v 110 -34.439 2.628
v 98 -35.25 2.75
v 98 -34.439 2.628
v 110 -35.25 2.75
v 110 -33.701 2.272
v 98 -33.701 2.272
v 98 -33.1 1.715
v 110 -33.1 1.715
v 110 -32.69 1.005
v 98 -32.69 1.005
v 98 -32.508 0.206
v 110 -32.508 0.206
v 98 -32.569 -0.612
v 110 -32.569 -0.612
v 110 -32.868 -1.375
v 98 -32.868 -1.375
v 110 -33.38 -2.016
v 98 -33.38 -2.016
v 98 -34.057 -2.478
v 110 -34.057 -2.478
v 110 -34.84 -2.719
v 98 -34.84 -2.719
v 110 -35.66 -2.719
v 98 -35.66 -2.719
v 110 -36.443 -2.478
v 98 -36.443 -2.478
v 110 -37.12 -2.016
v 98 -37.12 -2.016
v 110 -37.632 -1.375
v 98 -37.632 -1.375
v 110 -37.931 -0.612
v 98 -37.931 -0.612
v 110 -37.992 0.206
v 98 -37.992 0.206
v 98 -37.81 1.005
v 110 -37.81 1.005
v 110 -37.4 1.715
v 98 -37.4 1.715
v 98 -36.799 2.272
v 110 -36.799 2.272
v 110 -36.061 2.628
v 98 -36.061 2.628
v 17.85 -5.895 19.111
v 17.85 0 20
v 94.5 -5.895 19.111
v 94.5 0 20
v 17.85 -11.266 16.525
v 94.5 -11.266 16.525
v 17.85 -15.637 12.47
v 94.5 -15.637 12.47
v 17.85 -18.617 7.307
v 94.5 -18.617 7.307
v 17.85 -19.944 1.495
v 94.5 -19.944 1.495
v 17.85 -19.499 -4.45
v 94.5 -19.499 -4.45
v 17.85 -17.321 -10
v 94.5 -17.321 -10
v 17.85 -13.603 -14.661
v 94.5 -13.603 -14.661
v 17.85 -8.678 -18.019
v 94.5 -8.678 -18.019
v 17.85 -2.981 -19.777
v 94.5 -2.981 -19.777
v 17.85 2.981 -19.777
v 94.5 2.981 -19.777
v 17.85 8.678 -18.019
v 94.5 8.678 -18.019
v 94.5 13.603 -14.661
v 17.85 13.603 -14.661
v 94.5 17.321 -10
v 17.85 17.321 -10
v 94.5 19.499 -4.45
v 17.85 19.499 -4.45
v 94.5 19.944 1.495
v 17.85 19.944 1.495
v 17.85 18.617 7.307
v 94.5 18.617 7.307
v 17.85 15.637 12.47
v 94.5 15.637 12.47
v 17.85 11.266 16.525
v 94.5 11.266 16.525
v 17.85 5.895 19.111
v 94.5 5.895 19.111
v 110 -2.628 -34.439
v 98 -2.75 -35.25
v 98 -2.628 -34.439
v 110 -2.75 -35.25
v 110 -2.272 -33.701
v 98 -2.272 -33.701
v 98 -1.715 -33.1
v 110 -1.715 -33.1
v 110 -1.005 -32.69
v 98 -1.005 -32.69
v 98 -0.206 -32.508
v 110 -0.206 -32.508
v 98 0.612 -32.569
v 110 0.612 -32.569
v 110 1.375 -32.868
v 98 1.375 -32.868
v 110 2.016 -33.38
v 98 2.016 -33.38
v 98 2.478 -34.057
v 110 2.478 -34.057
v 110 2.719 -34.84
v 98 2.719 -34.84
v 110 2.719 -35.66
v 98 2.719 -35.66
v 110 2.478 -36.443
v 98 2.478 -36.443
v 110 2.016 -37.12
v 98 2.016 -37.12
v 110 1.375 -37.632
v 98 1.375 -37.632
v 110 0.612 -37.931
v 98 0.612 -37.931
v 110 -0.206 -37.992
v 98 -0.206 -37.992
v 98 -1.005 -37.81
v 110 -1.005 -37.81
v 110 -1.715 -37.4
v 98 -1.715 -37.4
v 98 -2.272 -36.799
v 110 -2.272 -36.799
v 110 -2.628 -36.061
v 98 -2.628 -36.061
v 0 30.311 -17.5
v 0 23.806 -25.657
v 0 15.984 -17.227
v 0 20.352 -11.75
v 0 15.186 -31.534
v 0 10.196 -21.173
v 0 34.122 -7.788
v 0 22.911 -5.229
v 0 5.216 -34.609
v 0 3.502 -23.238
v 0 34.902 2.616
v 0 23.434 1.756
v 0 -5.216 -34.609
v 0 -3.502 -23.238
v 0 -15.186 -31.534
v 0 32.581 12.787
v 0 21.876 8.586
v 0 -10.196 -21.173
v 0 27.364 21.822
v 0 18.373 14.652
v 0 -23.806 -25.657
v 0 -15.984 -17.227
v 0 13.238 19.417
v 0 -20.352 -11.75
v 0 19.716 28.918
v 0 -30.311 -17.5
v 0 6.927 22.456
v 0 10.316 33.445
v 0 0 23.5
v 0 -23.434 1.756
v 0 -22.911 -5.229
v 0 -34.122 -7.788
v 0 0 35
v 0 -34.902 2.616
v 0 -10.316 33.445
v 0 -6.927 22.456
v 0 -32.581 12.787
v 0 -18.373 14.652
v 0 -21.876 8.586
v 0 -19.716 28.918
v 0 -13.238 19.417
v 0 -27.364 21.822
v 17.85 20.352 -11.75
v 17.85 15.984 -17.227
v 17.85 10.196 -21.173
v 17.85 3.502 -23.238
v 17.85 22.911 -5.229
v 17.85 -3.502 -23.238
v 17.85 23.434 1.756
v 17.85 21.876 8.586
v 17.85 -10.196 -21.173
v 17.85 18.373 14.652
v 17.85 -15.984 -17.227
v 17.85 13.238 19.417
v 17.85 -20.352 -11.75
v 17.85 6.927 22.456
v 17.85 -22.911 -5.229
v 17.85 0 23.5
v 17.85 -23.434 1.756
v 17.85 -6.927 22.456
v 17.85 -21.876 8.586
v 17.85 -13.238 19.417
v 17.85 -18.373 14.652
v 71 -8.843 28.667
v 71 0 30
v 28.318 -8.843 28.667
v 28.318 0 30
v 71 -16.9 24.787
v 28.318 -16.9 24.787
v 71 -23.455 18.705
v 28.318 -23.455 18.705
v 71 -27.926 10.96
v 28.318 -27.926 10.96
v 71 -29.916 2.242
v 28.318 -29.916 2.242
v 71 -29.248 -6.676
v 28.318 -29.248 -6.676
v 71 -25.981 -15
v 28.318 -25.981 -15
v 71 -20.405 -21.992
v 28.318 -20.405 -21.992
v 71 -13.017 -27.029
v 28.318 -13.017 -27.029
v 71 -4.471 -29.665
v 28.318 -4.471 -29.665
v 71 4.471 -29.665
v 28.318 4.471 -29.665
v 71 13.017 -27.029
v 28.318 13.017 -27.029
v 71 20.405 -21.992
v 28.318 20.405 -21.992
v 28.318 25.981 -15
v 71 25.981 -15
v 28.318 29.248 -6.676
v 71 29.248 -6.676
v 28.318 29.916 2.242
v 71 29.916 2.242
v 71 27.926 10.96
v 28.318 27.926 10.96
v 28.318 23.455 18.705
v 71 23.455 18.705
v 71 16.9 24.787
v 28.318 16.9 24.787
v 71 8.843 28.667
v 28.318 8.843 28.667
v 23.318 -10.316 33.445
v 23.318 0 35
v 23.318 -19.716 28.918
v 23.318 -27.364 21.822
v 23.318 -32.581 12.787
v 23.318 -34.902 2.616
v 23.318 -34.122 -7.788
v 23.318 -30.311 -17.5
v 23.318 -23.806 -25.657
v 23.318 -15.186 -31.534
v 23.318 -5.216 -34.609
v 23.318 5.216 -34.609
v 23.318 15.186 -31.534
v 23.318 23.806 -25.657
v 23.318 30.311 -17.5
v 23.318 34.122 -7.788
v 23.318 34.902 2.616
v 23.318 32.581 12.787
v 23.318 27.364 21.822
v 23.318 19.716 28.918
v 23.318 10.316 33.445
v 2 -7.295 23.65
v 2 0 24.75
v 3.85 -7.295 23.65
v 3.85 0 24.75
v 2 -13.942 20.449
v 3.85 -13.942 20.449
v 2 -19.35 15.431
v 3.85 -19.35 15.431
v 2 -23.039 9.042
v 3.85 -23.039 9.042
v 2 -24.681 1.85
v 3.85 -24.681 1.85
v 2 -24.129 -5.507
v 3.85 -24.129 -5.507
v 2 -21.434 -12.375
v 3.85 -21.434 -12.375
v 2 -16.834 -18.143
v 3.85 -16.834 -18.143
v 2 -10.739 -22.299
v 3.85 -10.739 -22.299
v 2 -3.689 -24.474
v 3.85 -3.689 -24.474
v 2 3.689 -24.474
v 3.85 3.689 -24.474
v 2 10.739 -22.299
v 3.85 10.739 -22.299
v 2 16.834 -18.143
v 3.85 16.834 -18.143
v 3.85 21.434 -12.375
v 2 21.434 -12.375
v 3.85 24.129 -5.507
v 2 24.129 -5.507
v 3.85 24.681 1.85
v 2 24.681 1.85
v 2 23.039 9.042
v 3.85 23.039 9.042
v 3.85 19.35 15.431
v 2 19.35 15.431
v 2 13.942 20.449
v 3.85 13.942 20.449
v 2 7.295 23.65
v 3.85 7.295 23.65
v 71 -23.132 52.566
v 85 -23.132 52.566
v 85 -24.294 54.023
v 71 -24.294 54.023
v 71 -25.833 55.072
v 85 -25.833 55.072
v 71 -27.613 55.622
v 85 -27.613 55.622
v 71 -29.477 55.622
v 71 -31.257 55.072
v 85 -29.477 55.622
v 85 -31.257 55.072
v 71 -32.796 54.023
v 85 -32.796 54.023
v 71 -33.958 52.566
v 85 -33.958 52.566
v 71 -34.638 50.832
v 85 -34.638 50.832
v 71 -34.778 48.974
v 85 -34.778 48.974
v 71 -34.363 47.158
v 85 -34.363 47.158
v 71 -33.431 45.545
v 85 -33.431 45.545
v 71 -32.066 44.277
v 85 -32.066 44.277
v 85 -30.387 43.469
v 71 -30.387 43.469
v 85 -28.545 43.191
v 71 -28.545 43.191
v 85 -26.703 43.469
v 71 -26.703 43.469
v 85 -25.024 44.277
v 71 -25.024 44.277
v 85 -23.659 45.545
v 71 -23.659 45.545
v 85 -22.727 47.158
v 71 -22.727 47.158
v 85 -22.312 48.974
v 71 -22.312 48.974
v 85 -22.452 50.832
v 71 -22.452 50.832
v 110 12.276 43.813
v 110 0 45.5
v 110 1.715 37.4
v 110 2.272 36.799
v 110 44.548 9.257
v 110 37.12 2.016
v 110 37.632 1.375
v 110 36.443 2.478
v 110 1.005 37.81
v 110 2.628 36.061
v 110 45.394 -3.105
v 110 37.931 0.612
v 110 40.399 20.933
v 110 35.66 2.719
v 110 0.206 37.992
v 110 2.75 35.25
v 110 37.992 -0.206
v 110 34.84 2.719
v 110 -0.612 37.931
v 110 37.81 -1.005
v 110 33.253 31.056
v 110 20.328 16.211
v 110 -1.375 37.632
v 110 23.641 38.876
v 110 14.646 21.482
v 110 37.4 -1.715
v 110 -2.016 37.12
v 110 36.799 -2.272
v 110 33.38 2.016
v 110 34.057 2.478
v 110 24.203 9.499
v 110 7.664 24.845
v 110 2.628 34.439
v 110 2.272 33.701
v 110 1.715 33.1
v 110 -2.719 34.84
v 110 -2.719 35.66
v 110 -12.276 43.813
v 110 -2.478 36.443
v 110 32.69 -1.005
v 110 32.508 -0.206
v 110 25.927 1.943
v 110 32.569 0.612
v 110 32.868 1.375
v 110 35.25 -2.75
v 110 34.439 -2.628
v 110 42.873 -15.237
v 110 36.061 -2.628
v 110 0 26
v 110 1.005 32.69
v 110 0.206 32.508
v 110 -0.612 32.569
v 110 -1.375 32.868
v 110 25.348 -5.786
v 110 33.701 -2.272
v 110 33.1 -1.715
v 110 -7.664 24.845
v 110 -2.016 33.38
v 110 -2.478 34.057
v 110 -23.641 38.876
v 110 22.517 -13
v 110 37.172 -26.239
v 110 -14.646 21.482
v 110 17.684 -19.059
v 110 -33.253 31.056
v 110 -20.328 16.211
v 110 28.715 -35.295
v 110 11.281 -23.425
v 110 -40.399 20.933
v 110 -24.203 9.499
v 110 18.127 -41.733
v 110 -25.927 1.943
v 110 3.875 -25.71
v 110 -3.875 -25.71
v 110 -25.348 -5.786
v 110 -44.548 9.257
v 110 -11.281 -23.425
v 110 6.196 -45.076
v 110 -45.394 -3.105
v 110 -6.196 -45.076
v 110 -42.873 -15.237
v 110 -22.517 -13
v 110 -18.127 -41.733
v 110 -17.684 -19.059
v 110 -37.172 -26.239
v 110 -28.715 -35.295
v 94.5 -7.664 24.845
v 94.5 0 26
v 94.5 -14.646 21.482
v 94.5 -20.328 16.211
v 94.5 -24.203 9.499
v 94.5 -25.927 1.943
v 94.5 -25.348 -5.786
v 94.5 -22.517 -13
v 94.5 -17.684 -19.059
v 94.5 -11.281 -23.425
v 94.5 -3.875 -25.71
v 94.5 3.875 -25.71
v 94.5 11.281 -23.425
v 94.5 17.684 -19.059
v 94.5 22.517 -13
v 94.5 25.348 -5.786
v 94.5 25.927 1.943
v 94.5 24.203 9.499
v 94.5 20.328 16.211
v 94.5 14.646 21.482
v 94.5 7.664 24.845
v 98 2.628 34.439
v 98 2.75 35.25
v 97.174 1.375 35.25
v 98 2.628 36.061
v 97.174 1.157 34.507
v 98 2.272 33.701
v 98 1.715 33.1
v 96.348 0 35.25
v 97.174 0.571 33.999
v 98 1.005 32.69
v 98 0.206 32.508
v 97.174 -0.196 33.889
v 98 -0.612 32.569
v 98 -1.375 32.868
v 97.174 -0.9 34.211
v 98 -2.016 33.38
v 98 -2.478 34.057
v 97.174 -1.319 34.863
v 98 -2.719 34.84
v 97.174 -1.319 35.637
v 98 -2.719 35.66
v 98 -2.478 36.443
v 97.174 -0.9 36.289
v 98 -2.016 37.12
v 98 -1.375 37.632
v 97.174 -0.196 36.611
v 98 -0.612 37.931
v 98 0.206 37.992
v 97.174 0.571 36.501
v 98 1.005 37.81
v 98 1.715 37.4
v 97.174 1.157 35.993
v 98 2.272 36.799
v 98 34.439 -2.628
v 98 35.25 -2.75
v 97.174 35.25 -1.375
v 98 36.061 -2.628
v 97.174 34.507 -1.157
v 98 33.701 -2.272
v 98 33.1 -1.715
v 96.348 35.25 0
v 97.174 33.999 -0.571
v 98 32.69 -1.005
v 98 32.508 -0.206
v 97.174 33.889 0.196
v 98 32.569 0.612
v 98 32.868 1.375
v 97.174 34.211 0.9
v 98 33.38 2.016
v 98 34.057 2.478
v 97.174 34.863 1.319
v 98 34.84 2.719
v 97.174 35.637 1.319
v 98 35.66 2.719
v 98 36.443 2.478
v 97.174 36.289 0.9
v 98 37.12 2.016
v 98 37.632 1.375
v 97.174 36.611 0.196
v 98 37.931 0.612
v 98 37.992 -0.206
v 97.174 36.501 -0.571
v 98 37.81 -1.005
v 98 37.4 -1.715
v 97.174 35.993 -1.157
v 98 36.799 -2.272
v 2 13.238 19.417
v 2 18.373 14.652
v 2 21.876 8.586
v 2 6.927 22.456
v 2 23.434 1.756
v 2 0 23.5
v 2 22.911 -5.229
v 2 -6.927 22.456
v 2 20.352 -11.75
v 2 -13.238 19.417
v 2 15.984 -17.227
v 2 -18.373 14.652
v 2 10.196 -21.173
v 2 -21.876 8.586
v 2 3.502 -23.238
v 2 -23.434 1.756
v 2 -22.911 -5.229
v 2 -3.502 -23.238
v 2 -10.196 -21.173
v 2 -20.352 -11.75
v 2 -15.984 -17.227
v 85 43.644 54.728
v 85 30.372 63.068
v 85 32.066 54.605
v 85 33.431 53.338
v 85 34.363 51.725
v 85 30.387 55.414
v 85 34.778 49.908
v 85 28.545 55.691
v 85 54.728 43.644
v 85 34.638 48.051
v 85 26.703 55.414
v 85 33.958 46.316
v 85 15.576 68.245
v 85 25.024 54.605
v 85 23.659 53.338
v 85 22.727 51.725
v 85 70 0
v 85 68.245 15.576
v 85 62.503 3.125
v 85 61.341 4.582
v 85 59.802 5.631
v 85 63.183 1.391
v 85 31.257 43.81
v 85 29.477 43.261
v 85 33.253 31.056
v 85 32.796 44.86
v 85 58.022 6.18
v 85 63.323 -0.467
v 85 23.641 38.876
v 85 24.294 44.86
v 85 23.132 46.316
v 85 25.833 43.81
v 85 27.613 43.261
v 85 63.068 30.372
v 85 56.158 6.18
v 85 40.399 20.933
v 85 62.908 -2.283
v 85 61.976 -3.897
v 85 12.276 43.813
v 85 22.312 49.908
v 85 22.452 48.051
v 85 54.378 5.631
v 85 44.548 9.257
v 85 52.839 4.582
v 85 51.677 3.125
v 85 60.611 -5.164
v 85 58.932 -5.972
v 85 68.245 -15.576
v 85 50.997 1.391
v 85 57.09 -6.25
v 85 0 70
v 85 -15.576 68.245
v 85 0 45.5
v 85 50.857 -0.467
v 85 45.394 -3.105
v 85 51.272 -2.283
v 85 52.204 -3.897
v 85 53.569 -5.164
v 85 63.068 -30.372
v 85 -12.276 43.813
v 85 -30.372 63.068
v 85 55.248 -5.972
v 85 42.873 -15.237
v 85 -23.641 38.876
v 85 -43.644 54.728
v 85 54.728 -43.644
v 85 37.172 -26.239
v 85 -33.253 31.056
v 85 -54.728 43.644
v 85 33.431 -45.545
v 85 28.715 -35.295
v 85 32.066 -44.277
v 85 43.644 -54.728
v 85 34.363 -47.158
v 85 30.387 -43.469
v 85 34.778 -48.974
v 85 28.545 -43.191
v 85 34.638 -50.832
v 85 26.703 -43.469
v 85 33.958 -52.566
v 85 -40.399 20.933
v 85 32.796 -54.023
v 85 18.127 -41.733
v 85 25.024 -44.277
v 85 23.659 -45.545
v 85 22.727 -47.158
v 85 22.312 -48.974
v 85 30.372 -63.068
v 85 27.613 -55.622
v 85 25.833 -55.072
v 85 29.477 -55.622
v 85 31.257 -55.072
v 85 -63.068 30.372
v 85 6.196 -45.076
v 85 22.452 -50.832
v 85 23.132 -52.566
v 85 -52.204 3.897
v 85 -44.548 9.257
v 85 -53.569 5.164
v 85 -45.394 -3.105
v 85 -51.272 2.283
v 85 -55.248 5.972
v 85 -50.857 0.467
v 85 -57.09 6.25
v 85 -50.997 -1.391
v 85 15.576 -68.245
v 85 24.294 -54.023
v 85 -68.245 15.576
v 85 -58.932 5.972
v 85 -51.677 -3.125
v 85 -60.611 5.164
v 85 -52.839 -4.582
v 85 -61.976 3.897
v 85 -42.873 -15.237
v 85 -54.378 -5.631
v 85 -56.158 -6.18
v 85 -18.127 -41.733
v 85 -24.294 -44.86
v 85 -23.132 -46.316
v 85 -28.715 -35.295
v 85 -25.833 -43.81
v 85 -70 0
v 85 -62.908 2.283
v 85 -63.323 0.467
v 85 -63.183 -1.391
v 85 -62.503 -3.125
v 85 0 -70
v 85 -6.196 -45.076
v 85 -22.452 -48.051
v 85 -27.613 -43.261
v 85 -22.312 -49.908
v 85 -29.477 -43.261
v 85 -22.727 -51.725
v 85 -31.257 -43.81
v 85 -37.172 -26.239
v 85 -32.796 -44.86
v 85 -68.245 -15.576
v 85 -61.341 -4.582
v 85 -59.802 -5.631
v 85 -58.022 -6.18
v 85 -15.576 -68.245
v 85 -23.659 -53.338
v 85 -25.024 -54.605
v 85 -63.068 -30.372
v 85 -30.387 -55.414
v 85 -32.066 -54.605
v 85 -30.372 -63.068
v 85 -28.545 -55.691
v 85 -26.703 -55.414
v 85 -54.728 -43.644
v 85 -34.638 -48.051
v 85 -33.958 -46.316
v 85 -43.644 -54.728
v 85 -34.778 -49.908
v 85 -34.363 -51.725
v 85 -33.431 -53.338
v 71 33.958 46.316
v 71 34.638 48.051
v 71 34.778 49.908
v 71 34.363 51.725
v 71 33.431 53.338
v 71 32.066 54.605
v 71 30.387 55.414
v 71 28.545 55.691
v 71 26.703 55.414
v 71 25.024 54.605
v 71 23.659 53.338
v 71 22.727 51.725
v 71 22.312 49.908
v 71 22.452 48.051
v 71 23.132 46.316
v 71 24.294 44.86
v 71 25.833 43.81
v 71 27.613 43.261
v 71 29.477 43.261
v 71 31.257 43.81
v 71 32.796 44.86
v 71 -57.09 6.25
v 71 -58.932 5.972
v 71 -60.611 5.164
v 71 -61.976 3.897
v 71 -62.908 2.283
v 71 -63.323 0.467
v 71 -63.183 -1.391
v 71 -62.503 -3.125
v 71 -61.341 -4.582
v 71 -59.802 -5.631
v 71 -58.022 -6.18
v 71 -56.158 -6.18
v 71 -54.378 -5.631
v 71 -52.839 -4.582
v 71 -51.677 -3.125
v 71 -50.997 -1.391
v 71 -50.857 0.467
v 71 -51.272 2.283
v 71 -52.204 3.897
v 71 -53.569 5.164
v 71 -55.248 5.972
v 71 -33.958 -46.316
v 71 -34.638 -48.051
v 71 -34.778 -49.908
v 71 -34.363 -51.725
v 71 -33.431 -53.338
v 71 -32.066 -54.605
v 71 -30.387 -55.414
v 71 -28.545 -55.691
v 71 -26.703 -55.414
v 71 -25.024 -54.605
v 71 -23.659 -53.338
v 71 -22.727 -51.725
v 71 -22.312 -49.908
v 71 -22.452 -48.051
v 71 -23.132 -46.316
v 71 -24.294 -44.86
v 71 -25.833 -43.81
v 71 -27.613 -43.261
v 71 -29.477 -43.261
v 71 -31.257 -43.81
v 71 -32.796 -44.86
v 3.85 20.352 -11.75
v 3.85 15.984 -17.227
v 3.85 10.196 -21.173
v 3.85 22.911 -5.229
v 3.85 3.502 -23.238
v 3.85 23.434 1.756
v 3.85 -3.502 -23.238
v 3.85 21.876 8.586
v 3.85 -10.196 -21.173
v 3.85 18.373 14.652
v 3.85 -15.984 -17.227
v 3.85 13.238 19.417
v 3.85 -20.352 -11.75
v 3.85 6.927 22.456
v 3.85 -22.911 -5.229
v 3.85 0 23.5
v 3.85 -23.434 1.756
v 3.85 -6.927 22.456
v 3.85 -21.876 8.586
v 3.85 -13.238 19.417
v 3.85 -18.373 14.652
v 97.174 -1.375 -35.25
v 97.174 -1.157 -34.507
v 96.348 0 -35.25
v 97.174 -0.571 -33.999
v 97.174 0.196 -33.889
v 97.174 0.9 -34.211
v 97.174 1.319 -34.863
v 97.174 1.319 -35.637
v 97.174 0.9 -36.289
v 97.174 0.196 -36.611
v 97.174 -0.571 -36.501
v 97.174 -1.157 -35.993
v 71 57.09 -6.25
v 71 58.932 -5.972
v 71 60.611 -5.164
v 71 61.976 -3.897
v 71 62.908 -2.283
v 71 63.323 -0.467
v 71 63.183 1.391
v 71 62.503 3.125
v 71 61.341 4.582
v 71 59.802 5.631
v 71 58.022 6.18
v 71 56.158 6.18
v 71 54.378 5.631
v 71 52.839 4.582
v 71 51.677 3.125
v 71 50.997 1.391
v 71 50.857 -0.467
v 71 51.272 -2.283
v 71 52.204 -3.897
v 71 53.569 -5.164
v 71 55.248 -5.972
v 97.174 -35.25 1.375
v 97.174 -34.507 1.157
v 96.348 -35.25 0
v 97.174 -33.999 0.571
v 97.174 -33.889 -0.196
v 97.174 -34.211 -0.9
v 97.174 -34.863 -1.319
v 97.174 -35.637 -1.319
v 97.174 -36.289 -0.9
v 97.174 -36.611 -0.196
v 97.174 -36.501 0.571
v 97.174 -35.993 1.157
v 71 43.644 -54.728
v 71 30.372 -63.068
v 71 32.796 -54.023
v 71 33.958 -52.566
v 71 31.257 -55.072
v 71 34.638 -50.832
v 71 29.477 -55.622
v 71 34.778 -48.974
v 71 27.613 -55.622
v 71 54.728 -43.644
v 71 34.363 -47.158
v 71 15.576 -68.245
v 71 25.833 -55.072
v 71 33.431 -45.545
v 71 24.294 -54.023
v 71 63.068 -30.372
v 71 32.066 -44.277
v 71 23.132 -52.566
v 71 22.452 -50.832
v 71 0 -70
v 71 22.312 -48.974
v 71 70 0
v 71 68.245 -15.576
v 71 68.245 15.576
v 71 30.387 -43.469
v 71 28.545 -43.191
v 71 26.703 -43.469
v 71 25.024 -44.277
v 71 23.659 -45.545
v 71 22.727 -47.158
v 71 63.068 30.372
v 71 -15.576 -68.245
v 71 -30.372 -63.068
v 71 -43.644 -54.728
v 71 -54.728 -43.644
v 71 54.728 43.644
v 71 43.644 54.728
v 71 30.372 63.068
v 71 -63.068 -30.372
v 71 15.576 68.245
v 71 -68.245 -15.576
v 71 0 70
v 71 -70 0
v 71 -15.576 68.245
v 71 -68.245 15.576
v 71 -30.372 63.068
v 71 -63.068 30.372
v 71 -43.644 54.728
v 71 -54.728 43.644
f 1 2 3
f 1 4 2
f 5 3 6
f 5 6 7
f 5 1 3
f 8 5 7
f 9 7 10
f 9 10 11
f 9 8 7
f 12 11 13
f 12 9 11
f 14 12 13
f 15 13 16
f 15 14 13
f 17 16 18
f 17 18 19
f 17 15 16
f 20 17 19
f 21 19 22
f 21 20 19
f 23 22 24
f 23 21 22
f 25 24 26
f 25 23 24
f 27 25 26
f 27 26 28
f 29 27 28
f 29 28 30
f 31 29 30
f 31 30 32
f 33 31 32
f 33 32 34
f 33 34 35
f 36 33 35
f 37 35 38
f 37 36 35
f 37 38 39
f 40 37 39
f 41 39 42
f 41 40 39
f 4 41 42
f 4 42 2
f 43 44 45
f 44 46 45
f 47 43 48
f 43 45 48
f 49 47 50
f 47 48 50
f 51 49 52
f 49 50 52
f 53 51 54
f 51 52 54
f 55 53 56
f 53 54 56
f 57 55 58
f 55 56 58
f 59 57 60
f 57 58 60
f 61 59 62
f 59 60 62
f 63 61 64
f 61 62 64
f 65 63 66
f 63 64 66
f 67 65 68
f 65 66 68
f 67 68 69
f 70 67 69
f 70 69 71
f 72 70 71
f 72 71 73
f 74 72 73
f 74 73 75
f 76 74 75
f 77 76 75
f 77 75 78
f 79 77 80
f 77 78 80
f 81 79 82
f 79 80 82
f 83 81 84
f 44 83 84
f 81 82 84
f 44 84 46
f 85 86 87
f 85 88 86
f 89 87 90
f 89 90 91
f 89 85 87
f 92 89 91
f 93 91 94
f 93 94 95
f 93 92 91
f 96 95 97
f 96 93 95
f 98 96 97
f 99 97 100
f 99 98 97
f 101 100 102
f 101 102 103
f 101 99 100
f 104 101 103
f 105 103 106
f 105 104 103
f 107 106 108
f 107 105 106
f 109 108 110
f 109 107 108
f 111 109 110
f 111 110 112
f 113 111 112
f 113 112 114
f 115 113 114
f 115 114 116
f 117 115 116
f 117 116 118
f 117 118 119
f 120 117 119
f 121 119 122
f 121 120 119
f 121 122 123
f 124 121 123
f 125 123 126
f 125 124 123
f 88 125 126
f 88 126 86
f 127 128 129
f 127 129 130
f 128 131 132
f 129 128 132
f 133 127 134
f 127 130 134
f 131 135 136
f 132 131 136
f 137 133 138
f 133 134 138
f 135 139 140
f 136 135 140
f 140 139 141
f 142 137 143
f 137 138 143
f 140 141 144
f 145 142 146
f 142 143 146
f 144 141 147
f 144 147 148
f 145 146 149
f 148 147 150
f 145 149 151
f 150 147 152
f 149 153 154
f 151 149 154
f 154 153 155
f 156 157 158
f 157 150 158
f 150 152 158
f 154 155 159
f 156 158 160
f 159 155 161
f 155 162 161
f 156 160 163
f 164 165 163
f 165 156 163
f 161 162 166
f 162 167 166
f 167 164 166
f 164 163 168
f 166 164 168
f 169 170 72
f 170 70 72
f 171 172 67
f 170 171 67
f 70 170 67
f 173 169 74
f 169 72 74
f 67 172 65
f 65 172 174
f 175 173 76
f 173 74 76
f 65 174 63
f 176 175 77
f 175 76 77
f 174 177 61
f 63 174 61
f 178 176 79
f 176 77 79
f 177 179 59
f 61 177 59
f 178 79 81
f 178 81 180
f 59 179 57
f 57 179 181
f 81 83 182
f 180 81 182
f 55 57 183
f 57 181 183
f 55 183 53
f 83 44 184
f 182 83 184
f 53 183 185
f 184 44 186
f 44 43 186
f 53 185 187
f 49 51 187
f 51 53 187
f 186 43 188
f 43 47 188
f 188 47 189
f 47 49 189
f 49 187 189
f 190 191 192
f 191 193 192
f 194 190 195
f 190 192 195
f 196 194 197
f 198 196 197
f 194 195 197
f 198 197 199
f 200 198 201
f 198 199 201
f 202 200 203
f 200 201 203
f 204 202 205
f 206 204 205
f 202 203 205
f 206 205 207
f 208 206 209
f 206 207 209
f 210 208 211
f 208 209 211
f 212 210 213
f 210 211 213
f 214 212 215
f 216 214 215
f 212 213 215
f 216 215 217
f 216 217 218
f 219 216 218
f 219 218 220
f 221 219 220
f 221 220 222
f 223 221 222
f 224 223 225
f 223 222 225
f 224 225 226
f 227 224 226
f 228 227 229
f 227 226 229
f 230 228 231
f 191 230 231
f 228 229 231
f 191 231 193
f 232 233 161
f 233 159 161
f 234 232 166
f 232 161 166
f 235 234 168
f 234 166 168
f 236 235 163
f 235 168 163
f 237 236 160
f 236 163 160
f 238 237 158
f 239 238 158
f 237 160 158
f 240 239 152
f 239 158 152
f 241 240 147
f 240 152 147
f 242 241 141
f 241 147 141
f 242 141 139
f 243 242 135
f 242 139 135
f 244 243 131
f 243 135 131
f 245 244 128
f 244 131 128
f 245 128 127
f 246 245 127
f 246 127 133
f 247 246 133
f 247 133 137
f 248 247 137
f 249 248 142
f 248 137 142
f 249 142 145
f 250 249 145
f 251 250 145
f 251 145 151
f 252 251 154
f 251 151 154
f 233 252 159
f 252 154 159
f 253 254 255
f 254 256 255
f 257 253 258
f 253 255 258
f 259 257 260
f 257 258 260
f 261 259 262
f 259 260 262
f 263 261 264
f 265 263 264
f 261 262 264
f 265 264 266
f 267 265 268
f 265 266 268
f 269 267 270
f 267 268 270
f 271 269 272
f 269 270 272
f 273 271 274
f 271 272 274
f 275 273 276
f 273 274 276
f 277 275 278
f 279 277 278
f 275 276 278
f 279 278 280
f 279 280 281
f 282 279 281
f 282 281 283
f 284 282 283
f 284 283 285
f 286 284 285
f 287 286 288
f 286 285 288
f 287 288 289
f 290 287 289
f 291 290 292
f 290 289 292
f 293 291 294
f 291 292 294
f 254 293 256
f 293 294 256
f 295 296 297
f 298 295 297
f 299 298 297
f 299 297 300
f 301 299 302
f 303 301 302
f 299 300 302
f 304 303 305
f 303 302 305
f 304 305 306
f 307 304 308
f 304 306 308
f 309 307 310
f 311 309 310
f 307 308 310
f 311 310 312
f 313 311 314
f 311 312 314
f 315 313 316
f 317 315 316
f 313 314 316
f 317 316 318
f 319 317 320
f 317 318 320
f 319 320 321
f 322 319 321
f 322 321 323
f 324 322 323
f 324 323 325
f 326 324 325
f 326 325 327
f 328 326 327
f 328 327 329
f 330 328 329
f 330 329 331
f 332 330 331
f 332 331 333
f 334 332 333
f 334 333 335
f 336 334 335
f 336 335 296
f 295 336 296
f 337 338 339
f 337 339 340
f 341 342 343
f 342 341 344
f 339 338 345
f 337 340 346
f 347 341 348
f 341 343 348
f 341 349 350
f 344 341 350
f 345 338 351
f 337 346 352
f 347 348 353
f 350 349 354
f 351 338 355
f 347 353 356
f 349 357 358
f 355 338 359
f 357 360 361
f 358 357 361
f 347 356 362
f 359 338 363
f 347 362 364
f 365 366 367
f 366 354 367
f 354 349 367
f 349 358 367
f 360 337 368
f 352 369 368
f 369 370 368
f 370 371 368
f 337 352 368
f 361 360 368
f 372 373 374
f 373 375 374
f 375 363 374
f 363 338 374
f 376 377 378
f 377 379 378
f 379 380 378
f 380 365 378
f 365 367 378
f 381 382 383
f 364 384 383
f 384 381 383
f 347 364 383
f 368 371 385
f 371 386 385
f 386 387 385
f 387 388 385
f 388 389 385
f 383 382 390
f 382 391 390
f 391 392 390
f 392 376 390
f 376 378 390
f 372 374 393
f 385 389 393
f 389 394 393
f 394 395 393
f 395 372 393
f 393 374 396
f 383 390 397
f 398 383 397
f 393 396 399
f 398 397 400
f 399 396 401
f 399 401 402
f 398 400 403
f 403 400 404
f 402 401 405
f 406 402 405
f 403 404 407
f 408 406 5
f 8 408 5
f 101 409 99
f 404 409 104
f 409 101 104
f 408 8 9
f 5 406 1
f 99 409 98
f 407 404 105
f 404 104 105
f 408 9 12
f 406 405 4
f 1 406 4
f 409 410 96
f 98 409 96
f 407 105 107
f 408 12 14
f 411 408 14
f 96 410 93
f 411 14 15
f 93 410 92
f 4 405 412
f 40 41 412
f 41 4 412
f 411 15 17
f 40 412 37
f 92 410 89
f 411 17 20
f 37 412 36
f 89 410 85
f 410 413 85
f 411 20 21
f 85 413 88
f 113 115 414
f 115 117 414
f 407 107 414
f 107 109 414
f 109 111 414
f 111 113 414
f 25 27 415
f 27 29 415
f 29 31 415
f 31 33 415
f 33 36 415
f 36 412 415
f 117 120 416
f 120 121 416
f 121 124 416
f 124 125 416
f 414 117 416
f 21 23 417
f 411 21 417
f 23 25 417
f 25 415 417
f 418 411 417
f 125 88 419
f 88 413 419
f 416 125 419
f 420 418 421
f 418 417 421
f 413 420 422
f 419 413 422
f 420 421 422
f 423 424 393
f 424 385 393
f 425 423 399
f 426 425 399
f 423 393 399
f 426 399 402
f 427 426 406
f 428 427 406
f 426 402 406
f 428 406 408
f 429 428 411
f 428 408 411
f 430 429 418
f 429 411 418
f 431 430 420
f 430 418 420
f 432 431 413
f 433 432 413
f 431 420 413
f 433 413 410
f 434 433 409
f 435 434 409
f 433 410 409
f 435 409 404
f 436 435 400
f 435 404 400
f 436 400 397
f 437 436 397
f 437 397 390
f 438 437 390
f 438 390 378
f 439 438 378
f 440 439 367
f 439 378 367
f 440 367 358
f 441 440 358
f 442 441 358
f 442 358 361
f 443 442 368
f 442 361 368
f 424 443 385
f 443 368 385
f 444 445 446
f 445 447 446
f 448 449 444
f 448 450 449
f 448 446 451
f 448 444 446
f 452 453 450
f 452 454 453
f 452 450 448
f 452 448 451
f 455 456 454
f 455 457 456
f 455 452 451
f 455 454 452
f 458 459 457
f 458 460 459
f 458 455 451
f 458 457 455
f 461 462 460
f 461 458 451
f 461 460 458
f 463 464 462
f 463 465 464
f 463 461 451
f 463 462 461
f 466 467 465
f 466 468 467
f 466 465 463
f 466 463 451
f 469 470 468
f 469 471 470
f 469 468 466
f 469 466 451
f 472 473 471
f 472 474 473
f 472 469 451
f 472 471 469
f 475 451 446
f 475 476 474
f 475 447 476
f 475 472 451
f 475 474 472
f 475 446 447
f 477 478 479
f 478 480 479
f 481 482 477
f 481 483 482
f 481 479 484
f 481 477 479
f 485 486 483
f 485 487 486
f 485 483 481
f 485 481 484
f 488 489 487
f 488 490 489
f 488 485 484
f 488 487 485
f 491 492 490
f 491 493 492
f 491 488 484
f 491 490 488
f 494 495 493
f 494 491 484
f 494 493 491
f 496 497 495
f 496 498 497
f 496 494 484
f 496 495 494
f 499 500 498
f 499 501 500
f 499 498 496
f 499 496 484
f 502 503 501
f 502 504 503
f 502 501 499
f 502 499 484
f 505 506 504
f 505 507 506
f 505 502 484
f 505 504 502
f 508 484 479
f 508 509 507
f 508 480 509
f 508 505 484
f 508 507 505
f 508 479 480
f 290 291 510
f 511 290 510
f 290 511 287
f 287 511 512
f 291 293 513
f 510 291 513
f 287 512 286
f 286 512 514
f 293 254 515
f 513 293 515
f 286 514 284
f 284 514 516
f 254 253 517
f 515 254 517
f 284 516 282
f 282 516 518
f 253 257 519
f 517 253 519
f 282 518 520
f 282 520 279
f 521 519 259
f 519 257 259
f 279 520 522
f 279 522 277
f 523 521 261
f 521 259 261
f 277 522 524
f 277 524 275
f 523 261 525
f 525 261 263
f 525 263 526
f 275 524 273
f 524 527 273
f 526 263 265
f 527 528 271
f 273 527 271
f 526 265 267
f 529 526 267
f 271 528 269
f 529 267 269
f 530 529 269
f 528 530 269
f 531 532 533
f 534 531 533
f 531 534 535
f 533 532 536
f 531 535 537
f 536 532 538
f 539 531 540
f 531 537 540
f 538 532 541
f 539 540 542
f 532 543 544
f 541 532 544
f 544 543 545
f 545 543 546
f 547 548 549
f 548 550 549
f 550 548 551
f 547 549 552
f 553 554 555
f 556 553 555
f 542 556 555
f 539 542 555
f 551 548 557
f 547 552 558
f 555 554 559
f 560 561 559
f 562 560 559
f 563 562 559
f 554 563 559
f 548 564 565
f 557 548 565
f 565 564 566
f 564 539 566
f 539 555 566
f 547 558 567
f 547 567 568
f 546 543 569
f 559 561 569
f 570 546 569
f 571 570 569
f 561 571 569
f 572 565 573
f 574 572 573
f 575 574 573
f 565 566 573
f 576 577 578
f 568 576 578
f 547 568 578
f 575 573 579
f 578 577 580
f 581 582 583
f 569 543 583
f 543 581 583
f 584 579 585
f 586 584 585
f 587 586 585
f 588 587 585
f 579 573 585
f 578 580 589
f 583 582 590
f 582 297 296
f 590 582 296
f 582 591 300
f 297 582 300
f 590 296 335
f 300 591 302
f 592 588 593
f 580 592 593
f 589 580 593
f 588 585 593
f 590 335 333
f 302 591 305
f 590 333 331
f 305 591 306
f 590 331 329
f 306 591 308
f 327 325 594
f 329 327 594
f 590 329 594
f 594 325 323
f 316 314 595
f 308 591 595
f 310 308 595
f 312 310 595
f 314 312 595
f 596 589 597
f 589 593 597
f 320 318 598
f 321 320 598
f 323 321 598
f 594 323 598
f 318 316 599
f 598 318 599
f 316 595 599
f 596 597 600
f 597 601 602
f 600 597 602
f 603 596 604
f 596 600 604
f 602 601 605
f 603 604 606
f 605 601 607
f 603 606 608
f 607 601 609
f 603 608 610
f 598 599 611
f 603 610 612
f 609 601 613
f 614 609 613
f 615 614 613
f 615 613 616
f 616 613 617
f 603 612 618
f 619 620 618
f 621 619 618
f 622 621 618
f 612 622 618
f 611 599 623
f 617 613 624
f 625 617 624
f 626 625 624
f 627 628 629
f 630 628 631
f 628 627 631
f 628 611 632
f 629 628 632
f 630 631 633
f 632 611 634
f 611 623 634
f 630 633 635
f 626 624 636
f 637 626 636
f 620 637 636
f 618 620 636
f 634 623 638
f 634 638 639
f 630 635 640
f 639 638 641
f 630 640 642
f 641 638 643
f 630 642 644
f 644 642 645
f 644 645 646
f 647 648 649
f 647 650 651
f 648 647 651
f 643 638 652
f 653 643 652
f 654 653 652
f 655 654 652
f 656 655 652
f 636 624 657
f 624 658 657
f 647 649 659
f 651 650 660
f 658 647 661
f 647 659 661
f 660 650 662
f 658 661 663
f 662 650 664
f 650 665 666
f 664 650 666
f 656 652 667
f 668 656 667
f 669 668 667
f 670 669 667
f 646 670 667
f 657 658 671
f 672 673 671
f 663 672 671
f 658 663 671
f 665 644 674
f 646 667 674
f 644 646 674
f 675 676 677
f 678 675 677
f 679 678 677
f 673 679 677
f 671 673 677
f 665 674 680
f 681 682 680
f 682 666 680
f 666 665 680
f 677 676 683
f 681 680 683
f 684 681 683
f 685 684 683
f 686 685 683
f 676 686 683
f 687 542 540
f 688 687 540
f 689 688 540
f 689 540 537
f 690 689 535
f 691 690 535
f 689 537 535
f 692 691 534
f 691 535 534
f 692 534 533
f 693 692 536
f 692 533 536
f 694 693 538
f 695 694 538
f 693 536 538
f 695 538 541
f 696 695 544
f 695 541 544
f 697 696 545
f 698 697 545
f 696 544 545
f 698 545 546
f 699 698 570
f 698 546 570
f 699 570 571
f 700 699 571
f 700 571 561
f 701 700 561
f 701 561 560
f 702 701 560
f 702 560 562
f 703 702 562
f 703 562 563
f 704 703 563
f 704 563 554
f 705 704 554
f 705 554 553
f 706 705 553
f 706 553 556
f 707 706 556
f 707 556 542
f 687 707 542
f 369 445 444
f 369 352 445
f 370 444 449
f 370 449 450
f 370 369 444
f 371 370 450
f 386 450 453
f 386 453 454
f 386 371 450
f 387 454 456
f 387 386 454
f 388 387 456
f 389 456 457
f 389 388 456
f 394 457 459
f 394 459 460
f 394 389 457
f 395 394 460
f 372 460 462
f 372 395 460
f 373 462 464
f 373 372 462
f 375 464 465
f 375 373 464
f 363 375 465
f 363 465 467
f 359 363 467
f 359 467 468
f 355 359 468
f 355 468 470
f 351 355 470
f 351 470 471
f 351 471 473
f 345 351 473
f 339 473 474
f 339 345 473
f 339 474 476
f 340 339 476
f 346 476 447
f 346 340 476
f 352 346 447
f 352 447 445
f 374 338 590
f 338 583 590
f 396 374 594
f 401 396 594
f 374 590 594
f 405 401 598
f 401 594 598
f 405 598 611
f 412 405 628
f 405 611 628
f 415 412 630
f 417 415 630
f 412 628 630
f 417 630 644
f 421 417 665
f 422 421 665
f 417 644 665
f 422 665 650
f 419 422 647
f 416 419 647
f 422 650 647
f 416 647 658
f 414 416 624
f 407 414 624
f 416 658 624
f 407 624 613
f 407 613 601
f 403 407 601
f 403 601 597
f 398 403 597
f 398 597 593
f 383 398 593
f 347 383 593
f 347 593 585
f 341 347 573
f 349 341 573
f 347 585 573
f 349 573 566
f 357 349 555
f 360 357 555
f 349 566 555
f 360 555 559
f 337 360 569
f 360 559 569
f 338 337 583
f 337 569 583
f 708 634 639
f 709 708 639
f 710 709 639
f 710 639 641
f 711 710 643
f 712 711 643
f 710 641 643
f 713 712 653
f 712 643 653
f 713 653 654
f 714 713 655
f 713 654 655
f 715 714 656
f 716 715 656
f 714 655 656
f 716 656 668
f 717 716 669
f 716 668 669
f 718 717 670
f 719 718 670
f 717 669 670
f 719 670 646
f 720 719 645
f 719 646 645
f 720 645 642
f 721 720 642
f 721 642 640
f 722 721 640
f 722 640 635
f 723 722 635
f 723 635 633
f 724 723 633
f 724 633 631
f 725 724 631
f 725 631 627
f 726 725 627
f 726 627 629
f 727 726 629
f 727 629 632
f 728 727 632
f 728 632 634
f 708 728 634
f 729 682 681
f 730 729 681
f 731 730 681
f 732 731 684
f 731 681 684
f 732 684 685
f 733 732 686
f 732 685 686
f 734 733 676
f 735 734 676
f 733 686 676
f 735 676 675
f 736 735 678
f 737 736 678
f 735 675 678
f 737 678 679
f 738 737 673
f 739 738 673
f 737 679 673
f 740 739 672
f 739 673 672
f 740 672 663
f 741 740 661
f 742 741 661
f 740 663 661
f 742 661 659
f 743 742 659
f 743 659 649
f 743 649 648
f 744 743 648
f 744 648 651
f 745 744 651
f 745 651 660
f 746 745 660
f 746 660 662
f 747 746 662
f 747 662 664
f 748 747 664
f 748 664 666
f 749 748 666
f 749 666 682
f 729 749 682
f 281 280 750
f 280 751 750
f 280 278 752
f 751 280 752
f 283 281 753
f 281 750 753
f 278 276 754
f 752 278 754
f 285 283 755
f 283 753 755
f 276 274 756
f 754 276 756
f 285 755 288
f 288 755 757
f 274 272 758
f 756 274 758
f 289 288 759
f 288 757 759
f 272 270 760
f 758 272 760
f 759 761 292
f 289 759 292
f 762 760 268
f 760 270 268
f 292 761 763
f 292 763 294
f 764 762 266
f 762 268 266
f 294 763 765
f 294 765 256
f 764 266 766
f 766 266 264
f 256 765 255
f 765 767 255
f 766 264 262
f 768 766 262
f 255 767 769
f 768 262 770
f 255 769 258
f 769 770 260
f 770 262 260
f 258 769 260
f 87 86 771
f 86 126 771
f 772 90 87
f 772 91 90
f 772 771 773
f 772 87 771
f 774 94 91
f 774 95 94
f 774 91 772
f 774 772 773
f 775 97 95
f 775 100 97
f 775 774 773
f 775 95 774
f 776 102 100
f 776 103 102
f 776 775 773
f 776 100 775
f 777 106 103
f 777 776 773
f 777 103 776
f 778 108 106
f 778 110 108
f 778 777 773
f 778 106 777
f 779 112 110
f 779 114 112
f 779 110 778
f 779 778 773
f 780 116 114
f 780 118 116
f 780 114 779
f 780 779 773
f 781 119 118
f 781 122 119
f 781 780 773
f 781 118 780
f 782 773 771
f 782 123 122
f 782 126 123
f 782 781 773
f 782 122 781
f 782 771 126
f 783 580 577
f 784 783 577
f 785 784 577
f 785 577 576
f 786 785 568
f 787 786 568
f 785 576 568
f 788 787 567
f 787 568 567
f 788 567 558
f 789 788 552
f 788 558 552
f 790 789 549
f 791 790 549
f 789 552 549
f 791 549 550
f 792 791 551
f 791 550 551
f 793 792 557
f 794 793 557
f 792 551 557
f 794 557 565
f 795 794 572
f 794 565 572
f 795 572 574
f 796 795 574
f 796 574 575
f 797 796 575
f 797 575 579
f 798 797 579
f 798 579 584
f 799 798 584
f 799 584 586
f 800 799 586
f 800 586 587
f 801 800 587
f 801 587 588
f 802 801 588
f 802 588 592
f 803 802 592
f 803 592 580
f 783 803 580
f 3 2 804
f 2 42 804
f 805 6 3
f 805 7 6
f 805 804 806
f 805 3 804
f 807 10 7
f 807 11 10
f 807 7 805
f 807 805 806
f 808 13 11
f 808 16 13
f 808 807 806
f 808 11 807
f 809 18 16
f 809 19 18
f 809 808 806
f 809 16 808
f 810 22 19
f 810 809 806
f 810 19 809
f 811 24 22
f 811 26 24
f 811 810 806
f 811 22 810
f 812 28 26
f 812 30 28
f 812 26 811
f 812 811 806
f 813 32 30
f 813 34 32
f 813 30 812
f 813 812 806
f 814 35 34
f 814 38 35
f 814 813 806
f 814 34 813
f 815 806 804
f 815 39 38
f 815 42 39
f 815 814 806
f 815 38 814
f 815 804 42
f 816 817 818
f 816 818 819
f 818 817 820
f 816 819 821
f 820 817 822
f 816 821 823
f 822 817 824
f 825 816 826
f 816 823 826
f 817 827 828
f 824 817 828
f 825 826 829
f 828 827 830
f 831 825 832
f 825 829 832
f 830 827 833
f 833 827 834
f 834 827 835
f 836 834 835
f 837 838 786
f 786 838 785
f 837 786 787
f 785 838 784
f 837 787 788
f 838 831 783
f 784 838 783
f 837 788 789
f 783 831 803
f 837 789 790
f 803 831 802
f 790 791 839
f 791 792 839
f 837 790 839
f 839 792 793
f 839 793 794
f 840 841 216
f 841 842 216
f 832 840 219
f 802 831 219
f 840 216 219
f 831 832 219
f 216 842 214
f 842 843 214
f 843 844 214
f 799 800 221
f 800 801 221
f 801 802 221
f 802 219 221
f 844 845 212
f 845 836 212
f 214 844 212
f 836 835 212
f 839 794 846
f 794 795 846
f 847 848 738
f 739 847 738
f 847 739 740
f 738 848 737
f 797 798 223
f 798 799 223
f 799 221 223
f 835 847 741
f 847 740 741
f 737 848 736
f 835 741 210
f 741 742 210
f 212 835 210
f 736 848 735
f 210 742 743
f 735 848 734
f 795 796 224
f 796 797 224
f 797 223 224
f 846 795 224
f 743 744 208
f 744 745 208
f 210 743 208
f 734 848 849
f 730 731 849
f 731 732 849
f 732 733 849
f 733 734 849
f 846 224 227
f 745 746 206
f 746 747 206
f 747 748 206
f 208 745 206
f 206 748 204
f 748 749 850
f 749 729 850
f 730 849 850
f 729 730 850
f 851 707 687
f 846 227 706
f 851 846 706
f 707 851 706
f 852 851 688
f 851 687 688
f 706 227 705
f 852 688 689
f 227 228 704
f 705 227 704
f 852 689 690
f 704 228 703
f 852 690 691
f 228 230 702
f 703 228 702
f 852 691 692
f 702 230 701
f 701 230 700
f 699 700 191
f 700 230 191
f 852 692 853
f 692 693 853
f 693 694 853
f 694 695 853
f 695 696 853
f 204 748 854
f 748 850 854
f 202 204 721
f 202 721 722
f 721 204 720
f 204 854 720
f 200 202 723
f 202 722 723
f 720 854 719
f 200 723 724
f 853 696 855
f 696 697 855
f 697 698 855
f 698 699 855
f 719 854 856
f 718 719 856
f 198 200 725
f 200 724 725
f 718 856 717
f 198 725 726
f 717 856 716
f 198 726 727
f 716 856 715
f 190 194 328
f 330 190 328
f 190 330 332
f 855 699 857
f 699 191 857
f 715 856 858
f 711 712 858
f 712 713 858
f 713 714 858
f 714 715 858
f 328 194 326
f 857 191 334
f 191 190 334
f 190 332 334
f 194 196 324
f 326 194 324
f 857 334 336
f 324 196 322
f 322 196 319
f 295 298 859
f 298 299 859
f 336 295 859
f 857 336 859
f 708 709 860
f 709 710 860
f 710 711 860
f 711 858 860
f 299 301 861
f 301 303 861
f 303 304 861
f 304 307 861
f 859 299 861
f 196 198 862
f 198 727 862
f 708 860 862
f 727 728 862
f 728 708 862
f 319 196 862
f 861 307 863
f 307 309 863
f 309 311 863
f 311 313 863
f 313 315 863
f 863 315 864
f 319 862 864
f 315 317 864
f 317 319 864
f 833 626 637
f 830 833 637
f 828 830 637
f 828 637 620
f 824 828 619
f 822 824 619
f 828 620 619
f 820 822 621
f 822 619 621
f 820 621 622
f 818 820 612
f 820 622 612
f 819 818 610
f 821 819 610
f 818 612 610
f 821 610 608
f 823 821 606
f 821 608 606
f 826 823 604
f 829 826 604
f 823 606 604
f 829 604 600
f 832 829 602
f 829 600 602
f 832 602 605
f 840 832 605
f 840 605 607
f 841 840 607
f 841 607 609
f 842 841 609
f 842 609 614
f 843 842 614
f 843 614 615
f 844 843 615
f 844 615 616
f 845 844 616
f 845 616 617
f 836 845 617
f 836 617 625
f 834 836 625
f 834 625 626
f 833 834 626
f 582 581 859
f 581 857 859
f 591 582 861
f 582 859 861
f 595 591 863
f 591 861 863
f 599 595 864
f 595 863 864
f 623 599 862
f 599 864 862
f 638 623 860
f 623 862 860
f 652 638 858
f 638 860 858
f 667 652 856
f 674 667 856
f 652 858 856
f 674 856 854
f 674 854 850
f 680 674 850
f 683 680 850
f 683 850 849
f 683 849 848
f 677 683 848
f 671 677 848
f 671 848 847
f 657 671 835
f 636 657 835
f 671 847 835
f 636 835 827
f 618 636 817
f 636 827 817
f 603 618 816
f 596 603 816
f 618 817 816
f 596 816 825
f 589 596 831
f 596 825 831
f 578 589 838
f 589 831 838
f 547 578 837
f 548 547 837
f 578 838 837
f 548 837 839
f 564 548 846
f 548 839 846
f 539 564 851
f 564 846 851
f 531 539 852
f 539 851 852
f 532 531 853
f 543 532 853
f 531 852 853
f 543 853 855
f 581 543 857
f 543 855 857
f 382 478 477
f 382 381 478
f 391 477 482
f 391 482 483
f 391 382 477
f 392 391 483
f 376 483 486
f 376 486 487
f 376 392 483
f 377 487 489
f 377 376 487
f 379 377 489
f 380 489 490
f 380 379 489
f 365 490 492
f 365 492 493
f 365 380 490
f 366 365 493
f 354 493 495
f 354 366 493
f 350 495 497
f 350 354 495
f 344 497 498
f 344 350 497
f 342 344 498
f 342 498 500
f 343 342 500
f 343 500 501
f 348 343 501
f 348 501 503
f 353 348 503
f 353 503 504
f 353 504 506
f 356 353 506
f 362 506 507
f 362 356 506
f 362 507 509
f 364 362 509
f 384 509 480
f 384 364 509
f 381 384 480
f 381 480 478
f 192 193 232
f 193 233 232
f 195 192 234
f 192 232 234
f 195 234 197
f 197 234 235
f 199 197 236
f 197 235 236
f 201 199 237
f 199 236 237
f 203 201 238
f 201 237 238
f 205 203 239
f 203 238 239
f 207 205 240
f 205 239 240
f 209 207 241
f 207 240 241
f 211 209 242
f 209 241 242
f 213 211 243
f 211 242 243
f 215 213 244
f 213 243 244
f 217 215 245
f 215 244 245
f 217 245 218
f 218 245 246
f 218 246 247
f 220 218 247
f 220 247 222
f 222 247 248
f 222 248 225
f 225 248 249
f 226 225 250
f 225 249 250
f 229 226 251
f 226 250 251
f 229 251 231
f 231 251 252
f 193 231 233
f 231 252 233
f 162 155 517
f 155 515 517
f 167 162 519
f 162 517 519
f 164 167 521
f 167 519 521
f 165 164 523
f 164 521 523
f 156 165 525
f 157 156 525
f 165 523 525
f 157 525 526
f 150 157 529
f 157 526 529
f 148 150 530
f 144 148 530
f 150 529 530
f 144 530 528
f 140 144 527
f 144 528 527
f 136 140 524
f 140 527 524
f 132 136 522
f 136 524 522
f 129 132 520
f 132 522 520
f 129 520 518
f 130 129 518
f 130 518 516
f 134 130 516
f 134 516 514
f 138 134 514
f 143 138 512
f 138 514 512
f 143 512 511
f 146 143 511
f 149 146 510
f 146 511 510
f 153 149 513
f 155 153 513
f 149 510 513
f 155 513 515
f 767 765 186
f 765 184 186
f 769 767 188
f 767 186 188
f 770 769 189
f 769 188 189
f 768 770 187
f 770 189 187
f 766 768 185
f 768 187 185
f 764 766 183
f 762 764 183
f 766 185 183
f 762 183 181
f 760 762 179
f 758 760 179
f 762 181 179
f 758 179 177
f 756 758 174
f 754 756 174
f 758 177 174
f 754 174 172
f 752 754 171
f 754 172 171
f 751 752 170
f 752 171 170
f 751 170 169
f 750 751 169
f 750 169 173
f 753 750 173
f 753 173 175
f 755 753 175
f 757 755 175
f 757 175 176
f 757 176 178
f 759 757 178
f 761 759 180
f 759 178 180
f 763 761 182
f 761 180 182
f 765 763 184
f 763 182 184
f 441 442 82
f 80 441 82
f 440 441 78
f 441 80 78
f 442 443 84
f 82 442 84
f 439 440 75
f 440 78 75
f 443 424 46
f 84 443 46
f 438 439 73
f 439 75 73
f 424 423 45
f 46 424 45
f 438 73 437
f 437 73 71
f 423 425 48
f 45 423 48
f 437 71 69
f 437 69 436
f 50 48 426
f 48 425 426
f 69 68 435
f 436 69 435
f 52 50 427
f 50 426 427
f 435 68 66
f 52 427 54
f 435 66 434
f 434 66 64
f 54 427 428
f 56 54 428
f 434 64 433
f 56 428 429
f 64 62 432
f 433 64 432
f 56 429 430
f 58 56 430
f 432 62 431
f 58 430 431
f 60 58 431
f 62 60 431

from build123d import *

# Parameters (mm, degrees)
FORO_12_5_12_5_1_D          = 12.5
RIPETIZIONECIRCOLARE1_COUNT = 6
RIPETIZIONECIRCOLARE2_COUNT = 4


with BuildPart() as part:
    # Schizzo1 → Rivoluzione1 (revolve)
    with BuildSketch(Plane.XY, mode=Mode.PRIVATE) as rivoluzione1_sk:
        Polygon((0, 35), (0, 23.5), (2, 23.5), (2, 24.75), (3.85, 24.75), (3.85, 23.5), (17.85, 23.5), (17.85, 20), (94.5, 20), (94.5, 26), (110, 26), (110, 45.5), (85, 45.5), (85, 70), (71, 70), (71, 30), (28.317889407, 30), (23.317889407, 35), align=None)
    revolve(rivoluzione1_sk.sketch.rotate(Axis((-28.748065329, 0, 0), (1, 0, 0)), 90), axis=Axis((-28.748065329, 0, 0), (1, 0, 0)))

    # Foro Ø12.5 (12.5)-1 (through all)
    with Locations(Plane.ZY.offset(-71)):
        with Locations((0, 57.09)):
            foro_12_5_12_5_1 = Hole(FORO_12_5_12_5_1_D / 2)

    # RipetizioneCircolare1: Foro Ø12.5 (12.5)-1 ×6 about axis
    ripetizionecircolare1_axis = Axis((0, 0, 0), (1, 0, 0))
    for i in range(1, RIPETIZIONECIRCOLARE1_COUNT):
        add(foro_12_5_12_5_1.rotate(ripetizionecircolare1_axis, i * 360 / RIPETIZIONECIRCOLARE1_COUNT), mode=Mode.SUBTRACT)

    # Schizzo7 → Foro per Vite M5-1 (revolve, cut)
    with BuildSketch(Plane(origin=(110, 35.25, 0), x_dir=(0, 0, -1), z_dir=(0, 1, 0))):
        Polygon((0, 0), (0, 13.652366702), (2.75, 12), (2.75, 0), align=None)
    foro_per_vite_m5_1 = revolve(axis=Axis((116.35, 35.25, 0), (-1, 0, 0)), mode=Mode.SUBTRACT)

    # RipetizioneCircolare2: Foro per Vite M5-1 ×4 about axis
    ripetizionecircolare2_axis = Axis((0, 0, 0), (1, 0, 0))
    for i in range(1, RIPETIZIONECIRCOLARE2_COUNT):
        add(foro_per_vite_m5_1.rotate(ripetizionecircolare2_axis, i * 360 / RIPETIZIONECIRCOLARE2_COUNT), mode=Mode.SUBTRACT)


solid = part.part
